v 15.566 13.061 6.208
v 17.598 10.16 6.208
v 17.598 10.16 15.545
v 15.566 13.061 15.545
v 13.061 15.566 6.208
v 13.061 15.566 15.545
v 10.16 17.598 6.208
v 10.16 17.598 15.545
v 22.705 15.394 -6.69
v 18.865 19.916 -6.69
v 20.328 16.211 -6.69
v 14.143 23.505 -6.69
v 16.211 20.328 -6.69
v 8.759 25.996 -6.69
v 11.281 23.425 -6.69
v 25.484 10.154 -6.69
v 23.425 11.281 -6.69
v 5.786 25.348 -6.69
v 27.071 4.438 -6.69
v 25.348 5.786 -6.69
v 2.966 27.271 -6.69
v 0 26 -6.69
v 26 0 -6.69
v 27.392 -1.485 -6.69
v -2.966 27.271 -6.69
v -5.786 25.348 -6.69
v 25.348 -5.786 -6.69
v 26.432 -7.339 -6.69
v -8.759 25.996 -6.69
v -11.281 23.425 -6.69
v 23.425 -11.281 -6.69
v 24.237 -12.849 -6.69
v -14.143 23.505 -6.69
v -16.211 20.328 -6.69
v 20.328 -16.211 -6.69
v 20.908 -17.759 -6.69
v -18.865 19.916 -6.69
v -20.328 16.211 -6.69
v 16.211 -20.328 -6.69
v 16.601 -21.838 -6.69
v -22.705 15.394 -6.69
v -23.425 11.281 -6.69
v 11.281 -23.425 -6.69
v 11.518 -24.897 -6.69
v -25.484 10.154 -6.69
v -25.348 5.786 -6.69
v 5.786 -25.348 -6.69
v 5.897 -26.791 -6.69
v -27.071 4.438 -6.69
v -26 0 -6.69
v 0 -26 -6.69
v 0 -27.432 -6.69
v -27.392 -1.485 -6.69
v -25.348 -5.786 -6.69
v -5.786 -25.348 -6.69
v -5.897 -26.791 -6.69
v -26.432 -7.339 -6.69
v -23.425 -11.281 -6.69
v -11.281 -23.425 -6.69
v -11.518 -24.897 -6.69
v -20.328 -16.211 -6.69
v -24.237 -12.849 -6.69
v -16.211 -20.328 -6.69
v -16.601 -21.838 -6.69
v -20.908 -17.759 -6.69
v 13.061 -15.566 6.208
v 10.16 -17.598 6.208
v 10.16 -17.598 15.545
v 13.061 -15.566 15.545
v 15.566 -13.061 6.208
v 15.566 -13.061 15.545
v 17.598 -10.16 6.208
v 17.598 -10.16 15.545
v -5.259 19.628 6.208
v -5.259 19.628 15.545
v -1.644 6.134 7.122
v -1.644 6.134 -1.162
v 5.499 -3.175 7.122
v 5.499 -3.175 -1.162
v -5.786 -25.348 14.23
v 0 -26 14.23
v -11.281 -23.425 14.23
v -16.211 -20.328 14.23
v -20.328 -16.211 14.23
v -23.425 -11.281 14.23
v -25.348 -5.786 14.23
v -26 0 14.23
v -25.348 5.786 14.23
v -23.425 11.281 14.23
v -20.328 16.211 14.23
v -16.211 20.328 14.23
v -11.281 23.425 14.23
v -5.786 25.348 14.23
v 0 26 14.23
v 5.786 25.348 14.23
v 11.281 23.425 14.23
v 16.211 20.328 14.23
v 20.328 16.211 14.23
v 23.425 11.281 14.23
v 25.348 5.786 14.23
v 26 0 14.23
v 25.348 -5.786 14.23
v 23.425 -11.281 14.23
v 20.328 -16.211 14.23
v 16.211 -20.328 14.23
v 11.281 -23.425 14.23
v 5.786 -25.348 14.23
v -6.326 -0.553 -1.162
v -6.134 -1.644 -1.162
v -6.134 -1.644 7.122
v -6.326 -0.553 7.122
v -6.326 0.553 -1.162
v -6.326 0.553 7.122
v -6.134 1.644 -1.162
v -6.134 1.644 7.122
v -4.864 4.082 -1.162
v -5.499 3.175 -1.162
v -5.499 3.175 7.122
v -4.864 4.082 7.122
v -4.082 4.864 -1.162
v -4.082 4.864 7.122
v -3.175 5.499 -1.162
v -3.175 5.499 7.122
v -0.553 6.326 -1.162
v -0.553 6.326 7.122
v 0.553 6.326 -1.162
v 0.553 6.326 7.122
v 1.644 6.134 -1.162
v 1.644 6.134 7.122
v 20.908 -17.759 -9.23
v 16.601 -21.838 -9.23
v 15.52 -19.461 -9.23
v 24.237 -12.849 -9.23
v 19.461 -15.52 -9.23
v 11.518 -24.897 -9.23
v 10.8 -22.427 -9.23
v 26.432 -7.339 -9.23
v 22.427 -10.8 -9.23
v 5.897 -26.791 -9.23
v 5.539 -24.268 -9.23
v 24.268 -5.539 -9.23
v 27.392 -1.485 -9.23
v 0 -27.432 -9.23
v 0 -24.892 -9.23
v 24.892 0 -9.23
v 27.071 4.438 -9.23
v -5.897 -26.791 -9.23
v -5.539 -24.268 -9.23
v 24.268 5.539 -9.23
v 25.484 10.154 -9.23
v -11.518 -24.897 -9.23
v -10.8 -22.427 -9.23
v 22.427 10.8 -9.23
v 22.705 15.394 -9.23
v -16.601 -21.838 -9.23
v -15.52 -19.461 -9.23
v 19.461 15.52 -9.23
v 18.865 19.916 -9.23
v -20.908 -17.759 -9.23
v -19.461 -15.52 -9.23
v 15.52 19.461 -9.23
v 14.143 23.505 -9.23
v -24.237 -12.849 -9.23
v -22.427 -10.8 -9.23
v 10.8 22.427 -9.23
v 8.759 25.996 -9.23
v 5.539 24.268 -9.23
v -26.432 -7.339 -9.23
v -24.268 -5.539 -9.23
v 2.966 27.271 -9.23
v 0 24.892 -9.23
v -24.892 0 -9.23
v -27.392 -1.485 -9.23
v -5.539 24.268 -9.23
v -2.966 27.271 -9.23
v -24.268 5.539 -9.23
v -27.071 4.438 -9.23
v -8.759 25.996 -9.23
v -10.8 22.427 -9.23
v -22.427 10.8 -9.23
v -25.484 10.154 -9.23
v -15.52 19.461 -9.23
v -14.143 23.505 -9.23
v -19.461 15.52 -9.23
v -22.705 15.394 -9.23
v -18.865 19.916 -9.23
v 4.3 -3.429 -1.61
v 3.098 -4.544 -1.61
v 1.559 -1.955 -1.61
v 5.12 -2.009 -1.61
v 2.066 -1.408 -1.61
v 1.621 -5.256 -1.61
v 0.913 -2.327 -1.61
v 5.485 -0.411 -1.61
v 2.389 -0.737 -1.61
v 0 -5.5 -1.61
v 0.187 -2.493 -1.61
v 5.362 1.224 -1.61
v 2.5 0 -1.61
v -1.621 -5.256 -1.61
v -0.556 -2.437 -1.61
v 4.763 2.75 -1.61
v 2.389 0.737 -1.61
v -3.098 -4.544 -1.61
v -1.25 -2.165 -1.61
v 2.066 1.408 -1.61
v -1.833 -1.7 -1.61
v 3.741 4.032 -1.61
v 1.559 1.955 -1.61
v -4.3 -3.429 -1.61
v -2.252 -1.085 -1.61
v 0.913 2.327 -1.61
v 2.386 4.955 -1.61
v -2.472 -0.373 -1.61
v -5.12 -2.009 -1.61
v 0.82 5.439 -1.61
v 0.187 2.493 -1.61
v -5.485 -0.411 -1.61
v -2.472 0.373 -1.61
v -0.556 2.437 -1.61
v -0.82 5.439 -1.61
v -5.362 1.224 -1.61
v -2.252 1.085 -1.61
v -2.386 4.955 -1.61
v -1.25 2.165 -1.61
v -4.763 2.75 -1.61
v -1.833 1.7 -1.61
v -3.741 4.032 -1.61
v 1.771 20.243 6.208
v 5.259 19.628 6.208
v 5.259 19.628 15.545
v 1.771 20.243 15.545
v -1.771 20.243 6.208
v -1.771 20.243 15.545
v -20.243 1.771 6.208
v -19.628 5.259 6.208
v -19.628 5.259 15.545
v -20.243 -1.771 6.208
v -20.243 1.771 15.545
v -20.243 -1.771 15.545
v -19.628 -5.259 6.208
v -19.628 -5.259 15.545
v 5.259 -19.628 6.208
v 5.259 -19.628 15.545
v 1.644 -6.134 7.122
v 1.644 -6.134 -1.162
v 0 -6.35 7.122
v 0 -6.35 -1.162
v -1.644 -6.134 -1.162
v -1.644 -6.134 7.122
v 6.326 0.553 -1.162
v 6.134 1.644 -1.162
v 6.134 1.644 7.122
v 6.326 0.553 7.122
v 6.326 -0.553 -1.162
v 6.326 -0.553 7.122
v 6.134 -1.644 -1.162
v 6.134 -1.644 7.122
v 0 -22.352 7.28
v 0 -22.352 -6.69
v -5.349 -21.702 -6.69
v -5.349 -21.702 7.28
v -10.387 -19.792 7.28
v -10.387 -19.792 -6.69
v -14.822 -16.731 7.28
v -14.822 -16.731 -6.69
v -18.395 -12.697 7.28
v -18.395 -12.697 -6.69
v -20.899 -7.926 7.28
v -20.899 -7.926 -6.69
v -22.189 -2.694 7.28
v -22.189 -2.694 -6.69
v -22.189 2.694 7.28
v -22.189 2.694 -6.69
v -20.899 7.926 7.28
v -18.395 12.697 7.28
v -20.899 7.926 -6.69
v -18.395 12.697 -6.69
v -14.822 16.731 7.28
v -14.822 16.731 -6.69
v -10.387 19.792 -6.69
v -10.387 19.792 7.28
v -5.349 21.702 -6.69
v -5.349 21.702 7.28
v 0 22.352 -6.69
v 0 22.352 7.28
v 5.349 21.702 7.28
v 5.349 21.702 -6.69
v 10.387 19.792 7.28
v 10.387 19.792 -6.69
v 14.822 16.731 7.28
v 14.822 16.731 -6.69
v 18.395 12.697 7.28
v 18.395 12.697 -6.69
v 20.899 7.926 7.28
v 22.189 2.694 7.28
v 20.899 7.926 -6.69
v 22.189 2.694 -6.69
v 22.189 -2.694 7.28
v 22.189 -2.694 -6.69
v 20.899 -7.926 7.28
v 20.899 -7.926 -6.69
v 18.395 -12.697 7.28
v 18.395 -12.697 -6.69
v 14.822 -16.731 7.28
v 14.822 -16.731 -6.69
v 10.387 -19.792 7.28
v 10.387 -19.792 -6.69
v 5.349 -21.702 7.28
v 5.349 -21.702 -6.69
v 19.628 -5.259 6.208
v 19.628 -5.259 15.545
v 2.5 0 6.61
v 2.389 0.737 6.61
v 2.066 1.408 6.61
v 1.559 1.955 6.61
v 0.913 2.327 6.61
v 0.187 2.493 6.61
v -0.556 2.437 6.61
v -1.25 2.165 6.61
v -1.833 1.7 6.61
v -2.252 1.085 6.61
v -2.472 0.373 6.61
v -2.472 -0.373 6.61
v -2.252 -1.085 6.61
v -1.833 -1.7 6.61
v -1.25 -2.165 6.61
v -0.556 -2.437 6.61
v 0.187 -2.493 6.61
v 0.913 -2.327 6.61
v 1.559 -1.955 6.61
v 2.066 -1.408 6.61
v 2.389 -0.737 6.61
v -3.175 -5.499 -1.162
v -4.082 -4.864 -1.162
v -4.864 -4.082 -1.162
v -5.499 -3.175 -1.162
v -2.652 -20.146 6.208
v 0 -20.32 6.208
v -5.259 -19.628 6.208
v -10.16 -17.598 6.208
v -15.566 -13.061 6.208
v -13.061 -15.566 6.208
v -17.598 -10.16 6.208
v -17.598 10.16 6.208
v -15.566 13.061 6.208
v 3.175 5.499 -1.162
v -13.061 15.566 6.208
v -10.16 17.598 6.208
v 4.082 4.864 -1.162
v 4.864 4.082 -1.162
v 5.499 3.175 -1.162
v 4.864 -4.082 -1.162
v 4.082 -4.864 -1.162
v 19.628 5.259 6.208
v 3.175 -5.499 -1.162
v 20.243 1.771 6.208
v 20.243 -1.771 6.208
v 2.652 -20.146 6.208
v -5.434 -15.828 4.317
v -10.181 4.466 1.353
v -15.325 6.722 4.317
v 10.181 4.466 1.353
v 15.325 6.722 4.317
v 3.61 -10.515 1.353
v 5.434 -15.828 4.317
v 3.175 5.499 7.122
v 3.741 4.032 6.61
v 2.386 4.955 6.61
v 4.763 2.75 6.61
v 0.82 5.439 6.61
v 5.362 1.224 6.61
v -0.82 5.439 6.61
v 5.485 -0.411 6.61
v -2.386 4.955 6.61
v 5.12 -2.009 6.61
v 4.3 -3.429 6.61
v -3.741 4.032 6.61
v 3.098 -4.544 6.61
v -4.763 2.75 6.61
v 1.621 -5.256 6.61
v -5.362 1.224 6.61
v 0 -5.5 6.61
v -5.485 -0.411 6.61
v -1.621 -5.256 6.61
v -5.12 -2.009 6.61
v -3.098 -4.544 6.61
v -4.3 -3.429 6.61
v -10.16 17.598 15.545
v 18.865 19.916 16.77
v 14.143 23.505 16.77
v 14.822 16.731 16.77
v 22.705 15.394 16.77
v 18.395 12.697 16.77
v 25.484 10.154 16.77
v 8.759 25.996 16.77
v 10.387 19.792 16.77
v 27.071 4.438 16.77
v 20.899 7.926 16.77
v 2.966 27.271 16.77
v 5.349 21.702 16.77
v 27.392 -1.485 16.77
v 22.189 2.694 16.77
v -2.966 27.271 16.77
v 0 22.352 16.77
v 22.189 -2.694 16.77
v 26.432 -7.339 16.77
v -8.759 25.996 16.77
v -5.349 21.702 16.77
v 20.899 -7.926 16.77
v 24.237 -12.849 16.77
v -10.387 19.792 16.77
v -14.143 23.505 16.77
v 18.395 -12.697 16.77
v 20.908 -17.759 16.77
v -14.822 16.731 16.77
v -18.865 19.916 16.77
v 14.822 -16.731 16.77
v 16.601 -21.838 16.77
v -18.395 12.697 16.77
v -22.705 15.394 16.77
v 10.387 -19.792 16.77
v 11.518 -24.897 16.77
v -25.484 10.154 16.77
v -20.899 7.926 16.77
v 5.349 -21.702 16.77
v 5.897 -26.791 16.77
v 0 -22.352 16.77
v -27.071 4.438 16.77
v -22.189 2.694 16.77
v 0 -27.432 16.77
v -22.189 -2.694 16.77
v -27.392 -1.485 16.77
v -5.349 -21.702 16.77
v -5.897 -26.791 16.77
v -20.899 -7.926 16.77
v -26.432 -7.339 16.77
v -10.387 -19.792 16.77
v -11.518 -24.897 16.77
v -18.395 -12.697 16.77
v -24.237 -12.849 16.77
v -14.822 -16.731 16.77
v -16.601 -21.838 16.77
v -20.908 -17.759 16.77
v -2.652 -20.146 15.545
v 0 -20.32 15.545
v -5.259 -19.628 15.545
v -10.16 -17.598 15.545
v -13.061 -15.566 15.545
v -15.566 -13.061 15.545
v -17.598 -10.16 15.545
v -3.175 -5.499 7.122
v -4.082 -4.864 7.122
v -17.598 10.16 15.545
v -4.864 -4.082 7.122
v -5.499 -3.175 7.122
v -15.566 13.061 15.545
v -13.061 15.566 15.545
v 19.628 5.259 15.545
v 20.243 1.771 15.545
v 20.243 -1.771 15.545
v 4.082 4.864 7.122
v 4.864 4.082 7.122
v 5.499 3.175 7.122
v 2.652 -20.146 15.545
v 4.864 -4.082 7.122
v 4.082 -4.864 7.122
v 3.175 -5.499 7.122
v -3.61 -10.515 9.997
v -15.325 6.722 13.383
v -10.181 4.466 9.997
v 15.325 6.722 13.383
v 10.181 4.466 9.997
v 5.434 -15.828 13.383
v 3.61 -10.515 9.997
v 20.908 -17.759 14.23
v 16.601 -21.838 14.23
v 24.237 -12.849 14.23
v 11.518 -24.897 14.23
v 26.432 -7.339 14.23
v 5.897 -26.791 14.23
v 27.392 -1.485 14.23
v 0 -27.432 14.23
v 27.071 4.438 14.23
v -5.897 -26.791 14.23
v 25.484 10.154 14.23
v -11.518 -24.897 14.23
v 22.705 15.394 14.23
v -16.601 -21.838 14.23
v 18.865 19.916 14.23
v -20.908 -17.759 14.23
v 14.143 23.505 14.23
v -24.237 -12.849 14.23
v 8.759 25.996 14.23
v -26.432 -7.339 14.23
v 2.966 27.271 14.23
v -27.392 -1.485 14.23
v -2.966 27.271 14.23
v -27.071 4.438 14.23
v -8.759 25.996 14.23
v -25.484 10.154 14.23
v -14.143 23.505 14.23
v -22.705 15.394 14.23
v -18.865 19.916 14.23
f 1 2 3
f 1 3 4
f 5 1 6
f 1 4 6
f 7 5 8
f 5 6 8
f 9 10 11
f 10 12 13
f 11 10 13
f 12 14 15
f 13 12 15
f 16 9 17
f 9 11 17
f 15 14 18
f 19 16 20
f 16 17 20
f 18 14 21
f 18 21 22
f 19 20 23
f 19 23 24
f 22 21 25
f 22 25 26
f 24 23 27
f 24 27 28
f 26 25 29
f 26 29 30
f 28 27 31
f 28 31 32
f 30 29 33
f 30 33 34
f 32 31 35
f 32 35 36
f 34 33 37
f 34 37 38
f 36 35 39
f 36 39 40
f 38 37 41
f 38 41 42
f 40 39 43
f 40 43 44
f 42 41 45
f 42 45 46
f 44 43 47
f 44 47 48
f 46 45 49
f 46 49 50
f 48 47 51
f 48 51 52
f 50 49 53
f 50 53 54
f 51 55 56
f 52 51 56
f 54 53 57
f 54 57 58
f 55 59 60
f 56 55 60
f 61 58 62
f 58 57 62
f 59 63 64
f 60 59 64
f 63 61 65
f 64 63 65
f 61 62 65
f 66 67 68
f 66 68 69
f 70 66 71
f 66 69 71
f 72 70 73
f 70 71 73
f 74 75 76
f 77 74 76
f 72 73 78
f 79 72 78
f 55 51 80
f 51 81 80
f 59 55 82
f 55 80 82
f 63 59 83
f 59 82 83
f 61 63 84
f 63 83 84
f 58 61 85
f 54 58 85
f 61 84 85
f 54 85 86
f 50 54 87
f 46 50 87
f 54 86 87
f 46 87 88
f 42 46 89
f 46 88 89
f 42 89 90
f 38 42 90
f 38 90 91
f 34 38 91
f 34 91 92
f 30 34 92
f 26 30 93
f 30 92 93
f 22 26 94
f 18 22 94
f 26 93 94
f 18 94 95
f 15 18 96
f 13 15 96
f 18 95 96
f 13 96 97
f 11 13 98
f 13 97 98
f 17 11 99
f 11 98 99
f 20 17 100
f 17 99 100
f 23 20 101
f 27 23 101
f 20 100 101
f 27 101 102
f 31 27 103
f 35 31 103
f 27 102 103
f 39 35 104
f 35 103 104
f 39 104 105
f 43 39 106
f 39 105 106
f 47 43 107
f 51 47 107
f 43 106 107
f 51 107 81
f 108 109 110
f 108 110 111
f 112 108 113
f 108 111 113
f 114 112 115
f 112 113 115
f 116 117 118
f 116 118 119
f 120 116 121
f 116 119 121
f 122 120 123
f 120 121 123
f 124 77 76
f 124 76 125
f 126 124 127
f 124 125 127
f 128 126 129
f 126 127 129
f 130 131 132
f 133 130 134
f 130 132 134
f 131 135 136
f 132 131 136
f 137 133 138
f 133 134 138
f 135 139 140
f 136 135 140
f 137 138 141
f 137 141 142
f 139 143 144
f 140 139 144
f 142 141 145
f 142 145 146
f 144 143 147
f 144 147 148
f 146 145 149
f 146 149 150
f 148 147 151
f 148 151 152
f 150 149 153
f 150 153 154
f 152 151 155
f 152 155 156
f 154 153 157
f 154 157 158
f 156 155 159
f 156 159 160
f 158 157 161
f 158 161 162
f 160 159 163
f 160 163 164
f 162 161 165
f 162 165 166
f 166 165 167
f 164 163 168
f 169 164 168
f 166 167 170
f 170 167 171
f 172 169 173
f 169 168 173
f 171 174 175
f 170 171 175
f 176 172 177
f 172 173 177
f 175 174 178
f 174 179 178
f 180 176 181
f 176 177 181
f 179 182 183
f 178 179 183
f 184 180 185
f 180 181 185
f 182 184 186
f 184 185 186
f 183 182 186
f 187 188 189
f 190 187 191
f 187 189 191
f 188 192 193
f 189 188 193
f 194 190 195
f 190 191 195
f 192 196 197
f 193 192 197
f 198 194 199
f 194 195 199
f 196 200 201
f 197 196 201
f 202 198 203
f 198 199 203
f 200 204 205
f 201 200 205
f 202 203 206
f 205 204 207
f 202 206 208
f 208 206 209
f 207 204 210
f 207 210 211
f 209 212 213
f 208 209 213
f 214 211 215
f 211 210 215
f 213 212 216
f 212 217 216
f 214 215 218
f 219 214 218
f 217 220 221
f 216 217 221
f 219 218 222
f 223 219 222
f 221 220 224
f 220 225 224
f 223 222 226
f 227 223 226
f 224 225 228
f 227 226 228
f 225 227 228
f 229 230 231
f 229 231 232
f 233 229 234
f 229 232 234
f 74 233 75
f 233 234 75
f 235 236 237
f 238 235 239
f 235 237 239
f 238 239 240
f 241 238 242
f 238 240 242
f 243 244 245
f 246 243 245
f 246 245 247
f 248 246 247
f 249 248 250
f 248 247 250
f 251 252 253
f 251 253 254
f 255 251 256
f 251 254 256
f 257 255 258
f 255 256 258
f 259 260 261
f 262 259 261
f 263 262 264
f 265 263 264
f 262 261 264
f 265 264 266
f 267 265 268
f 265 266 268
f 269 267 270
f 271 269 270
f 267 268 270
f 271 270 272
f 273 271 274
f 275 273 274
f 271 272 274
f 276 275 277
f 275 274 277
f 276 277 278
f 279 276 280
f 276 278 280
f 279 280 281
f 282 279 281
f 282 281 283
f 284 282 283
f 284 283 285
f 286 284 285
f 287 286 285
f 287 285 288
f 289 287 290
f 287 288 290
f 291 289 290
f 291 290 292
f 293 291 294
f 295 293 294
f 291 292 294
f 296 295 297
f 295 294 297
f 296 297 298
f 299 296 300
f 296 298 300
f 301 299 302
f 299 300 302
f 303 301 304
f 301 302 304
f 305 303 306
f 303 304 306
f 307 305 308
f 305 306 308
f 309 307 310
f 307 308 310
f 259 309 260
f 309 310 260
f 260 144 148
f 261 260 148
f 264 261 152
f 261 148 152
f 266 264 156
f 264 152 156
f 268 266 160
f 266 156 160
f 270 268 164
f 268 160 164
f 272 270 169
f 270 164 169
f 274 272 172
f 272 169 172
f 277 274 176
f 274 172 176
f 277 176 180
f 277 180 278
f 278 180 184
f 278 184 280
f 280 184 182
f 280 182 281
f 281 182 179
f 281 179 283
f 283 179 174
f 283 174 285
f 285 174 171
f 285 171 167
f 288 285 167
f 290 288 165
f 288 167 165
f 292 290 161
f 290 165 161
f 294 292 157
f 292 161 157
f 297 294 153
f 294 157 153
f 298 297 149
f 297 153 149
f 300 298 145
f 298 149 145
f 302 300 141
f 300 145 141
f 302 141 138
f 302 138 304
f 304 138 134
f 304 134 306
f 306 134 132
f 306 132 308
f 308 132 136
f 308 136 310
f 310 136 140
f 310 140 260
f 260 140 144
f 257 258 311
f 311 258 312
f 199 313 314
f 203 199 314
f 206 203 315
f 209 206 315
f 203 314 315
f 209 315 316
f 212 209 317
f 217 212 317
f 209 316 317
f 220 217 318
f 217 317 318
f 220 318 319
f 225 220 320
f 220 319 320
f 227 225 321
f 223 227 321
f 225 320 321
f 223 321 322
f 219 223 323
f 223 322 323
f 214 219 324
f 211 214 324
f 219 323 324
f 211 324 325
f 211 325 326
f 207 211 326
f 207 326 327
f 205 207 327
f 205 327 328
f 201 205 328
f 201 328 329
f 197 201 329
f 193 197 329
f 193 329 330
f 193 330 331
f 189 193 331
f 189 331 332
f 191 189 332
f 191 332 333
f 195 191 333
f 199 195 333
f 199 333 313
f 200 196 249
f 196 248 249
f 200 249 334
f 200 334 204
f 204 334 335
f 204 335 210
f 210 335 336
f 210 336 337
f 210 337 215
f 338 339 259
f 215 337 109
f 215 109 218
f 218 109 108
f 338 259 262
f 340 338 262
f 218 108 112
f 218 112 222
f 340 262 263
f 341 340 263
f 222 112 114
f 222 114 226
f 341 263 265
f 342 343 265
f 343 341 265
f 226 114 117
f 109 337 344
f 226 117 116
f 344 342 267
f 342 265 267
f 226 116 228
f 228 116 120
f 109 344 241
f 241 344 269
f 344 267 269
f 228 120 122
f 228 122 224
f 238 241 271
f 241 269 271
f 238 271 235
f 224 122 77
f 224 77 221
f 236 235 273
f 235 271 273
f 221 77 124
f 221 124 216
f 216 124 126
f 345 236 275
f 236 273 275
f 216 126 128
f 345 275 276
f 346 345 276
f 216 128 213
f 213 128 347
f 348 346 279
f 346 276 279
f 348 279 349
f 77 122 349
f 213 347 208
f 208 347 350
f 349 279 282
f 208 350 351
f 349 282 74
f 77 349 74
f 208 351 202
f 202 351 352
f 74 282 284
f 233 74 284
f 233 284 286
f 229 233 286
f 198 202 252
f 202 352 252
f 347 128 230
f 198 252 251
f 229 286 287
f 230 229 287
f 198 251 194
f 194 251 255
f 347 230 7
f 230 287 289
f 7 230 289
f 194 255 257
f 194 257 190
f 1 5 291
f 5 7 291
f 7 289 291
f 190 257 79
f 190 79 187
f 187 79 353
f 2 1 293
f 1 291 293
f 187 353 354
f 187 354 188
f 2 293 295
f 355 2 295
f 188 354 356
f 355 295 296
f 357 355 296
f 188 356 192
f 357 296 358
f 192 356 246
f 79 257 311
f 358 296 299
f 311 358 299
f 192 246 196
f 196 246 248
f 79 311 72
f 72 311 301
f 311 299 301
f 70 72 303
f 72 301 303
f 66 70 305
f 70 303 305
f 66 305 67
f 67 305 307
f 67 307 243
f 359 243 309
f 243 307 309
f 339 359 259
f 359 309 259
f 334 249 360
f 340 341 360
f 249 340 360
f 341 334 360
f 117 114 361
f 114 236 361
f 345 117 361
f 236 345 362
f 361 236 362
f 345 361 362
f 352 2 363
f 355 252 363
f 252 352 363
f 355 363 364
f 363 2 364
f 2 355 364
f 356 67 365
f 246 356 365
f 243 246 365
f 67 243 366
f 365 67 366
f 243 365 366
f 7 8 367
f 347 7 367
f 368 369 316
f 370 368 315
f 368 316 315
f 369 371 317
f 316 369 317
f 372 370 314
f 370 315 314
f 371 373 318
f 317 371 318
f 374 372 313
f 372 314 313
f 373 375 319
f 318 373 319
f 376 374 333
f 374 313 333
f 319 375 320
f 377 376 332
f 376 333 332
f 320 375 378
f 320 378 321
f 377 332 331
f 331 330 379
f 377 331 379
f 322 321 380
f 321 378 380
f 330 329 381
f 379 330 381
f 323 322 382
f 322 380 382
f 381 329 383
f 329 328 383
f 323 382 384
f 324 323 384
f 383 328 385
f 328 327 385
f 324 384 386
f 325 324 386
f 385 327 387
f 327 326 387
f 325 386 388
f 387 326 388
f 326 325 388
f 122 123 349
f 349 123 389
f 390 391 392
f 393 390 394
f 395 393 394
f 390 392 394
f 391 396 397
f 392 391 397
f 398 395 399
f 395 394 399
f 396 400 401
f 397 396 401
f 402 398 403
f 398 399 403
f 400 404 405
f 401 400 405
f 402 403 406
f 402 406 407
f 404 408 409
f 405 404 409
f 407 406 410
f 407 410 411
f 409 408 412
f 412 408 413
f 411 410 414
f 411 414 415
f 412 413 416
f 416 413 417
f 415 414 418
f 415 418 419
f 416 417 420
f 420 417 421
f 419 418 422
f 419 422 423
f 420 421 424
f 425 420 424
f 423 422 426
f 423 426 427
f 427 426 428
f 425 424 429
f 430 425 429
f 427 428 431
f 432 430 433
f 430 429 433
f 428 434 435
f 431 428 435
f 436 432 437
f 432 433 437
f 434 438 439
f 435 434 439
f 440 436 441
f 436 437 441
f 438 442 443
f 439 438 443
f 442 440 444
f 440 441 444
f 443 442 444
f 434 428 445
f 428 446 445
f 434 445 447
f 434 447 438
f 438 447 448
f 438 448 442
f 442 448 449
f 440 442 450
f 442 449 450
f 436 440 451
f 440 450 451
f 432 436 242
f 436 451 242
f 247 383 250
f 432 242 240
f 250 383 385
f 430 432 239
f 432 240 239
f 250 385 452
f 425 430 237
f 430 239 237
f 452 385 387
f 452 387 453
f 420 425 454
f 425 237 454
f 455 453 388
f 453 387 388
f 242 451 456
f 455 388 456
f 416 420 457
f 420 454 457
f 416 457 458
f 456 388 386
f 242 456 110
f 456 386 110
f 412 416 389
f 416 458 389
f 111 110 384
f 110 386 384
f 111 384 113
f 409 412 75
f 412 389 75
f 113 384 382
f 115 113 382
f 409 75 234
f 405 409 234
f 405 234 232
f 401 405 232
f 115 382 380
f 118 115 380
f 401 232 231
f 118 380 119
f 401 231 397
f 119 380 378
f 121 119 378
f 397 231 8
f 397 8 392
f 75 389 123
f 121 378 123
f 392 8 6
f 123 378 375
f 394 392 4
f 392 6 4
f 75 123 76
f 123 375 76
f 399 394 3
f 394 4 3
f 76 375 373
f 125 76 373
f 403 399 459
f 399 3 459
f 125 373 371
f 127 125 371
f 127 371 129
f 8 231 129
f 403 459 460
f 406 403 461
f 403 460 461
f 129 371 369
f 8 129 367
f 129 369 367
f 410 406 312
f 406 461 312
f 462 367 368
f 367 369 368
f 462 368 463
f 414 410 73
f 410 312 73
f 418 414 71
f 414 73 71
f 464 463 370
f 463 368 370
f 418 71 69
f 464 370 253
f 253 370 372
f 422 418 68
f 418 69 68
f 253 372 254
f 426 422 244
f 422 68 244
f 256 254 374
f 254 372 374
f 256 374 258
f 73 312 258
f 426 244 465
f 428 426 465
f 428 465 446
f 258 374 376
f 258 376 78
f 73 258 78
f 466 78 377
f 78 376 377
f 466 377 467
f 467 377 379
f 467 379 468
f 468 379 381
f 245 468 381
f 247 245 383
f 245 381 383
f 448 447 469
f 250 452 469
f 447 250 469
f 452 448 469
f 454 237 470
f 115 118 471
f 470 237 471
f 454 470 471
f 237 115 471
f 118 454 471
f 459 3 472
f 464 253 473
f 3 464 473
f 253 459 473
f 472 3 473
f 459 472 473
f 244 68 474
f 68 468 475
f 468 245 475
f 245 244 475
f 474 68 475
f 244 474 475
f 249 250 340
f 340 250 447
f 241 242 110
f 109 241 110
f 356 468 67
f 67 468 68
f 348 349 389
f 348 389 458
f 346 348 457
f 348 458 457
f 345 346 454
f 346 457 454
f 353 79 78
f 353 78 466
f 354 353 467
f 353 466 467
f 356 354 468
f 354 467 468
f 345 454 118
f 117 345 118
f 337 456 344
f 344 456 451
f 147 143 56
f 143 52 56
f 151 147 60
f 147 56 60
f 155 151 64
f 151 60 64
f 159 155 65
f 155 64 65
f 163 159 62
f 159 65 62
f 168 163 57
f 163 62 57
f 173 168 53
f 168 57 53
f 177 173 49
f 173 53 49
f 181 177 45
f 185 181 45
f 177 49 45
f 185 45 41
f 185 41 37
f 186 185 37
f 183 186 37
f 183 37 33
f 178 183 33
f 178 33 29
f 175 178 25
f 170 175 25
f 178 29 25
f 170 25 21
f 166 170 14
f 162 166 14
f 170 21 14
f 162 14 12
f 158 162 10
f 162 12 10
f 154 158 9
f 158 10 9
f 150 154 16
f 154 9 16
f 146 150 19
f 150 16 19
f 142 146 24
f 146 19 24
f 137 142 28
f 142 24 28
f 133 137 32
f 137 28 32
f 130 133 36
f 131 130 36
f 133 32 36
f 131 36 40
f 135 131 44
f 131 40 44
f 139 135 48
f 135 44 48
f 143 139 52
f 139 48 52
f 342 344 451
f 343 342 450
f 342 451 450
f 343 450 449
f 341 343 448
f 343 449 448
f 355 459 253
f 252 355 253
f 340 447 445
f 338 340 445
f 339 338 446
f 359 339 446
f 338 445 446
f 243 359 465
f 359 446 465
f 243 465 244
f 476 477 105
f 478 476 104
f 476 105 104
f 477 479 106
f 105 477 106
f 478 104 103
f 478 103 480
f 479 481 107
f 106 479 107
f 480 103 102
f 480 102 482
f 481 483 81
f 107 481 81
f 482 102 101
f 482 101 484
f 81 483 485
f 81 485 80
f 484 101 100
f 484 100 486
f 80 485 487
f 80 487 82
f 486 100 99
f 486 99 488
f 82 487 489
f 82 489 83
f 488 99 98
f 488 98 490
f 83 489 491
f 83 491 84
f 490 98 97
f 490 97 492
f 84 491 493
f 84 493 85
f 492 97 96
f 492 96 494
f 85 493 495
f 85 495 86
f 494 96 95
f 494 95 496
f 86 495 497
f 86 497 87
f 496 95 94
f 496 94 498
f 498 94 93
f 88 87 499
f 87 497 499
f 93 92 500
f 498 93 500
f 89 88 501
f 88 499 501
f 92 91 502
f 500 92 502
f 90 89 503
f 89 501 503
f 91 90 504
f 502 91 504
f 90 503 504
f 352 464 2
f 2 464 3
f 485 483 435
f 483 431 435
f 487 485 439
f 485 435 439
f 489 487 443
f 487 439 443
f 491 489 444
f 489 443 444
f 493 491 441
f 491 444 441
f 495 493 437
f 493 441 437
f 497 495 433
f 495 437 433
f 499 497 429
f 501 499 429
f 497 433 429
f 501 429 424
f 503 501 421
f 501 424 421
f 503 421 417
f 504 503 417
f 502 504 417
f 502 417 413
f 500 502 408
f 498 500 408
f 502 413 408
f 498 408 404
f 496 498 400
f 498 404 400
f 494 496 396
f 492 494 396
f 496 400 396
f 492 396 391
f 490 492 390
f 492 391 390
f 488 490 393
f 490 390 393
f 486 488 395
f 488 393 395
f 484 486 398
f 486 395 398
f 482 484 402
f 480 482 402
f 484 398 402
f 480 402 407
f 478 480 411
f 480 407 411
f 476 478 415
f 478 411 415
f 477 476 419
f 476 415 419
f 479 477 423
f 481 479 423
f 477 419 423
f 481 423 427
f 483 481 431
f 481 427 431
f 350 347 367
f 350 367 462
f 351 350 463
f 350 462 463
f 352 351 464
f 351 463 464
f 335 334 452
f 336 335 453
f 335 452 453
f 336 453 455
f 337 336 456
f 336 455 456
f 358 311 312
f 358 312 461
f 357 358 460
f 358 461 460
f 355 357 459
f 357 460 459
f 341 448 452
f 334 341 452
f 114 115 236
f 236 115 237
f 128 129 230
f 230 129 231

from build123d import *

# Parameters (mm, degrees)
CUT_EXTRUDE1_REACH = 48.701
CIRPATTERN1_COUNT  = 8
CHAMFER1_SIZE      = 2.54
CUT_EXTRUDE2_REACH = 43.904
SKETCH3_R          = 2.5


with BuildPart() as part:
    # Sketch1 → Revolve1 (revolve)
    with BuildSketch(Plane(origin=(0, 0, 0), x_dir=(0, 0, -1), z_dir=(1, 0, 0)), mode=Mode.PRIVATE) as revolve1_sk:
        Polygon((-6.61, 0), (1.61, 0), (1.61, 2.6), (1.61, 5.5), (-7.28, 22.352), (9.23, 22.352), (9.23, 27.432), (6.69, 27.432), (6.69, 26), (-14.23, 26), (-14.23, 27.432), (-16.77, 27.432), (-16.77, 22.352), (-6.61, 5.5), align=None)
    revolve(revolve1_sk.sketch.rotate(Axis((0, 0, 6.61), (0, 0, -1)), 180), axis=Axis((0, 0, 6.61), (0, 0, -1)))

    # Cut-Extrude1: up to this cone (the profile starts inside it)
    cut_extrude1_end = Plane(origin=(0, 0, 16.77), z_dir=(0, 0, 1)).offset(-21.281435031) * Cone(1.896e-06, 210.079048668, 110.82380286, align=(Align.CENTER, Align.CENTER, Align.MIN), mode=Mode.PRIVATE)
    # Sketch2 → Cut-Extrude1 (cut, up to the surface)
    with BuildSketch(Plane.XY.offset(16.77), mode=Mode.PRIVATE) as cut_extrude1_sk1:
        with BuildLine():
            Line((-5.259202996, 19.62761279), (-1.643500936, 6.133628997))
            ThreePointArc((-1.643500936, 6.133628997), (0, 6.35), (1.643500936, 6.133628997))
            Line((1.643500936, 6.133628997), (5.259202996, 19.62761279))
            ThreePointArc((5.259202996, 19.62761279), (0, 20.32), (-5.259202996, 19.62761279))
        make_face()
    cut_extrude1_tool1 = extrude(cut_extrude1_sk1.sketch, amount=-CUT_EXTRUDE1_REACH, mode=Mode.PRIVATE) & cut_extrude1_end
    cut_extrude1 = cut_extrude1_tool1.solids().sort_by_distance((0, 14.388913, 16.77))[0]
    add(cut_extrude1, mode=Mode.SUBTRACT)

    # CirPattern1: Cut-Extrude1 ×8 about axis
    cirpattern1_axis = Axis((0, 0, 0), (0, 0, 1))
    for i in range(1, CIRPATTERN1_COUNT):
        add(cut_extrude1.rotate(cirpattern1_axis, i * 360 / CIRPATTERN1_COUNT), mode=Mode.SUBTRACT)

    # Chamfer1
    chamfer1_edges = [part.edges().sort_by_distance(p)[0] for p in [
        (0, 22.352, -9.23),
    ]]
    chamfer(chamfer1_edges, length=CHAMFER1_SIZE)

    # Sketch3 → Cut-Extrude2 (cut, up to next)
    with BuildSketch(Plane.XY.offset(6.61), mode=Mode.PRIVATE) as cut_extrude2_sk1:
        Circle(SKETCH3_R)
    cut_extrude2_tool1 = extrude(cut_extrude2_sk1.sketch, amount=-CUT_EXTRUDE2_REACH, mode=Mode.PRIVATE) & part.part
    add(cut_extrude2_tool1.solids().sort_by_distance((0, 0, 6.61))[0], mode=Mode.SUBTRACT)


solid = part.part
